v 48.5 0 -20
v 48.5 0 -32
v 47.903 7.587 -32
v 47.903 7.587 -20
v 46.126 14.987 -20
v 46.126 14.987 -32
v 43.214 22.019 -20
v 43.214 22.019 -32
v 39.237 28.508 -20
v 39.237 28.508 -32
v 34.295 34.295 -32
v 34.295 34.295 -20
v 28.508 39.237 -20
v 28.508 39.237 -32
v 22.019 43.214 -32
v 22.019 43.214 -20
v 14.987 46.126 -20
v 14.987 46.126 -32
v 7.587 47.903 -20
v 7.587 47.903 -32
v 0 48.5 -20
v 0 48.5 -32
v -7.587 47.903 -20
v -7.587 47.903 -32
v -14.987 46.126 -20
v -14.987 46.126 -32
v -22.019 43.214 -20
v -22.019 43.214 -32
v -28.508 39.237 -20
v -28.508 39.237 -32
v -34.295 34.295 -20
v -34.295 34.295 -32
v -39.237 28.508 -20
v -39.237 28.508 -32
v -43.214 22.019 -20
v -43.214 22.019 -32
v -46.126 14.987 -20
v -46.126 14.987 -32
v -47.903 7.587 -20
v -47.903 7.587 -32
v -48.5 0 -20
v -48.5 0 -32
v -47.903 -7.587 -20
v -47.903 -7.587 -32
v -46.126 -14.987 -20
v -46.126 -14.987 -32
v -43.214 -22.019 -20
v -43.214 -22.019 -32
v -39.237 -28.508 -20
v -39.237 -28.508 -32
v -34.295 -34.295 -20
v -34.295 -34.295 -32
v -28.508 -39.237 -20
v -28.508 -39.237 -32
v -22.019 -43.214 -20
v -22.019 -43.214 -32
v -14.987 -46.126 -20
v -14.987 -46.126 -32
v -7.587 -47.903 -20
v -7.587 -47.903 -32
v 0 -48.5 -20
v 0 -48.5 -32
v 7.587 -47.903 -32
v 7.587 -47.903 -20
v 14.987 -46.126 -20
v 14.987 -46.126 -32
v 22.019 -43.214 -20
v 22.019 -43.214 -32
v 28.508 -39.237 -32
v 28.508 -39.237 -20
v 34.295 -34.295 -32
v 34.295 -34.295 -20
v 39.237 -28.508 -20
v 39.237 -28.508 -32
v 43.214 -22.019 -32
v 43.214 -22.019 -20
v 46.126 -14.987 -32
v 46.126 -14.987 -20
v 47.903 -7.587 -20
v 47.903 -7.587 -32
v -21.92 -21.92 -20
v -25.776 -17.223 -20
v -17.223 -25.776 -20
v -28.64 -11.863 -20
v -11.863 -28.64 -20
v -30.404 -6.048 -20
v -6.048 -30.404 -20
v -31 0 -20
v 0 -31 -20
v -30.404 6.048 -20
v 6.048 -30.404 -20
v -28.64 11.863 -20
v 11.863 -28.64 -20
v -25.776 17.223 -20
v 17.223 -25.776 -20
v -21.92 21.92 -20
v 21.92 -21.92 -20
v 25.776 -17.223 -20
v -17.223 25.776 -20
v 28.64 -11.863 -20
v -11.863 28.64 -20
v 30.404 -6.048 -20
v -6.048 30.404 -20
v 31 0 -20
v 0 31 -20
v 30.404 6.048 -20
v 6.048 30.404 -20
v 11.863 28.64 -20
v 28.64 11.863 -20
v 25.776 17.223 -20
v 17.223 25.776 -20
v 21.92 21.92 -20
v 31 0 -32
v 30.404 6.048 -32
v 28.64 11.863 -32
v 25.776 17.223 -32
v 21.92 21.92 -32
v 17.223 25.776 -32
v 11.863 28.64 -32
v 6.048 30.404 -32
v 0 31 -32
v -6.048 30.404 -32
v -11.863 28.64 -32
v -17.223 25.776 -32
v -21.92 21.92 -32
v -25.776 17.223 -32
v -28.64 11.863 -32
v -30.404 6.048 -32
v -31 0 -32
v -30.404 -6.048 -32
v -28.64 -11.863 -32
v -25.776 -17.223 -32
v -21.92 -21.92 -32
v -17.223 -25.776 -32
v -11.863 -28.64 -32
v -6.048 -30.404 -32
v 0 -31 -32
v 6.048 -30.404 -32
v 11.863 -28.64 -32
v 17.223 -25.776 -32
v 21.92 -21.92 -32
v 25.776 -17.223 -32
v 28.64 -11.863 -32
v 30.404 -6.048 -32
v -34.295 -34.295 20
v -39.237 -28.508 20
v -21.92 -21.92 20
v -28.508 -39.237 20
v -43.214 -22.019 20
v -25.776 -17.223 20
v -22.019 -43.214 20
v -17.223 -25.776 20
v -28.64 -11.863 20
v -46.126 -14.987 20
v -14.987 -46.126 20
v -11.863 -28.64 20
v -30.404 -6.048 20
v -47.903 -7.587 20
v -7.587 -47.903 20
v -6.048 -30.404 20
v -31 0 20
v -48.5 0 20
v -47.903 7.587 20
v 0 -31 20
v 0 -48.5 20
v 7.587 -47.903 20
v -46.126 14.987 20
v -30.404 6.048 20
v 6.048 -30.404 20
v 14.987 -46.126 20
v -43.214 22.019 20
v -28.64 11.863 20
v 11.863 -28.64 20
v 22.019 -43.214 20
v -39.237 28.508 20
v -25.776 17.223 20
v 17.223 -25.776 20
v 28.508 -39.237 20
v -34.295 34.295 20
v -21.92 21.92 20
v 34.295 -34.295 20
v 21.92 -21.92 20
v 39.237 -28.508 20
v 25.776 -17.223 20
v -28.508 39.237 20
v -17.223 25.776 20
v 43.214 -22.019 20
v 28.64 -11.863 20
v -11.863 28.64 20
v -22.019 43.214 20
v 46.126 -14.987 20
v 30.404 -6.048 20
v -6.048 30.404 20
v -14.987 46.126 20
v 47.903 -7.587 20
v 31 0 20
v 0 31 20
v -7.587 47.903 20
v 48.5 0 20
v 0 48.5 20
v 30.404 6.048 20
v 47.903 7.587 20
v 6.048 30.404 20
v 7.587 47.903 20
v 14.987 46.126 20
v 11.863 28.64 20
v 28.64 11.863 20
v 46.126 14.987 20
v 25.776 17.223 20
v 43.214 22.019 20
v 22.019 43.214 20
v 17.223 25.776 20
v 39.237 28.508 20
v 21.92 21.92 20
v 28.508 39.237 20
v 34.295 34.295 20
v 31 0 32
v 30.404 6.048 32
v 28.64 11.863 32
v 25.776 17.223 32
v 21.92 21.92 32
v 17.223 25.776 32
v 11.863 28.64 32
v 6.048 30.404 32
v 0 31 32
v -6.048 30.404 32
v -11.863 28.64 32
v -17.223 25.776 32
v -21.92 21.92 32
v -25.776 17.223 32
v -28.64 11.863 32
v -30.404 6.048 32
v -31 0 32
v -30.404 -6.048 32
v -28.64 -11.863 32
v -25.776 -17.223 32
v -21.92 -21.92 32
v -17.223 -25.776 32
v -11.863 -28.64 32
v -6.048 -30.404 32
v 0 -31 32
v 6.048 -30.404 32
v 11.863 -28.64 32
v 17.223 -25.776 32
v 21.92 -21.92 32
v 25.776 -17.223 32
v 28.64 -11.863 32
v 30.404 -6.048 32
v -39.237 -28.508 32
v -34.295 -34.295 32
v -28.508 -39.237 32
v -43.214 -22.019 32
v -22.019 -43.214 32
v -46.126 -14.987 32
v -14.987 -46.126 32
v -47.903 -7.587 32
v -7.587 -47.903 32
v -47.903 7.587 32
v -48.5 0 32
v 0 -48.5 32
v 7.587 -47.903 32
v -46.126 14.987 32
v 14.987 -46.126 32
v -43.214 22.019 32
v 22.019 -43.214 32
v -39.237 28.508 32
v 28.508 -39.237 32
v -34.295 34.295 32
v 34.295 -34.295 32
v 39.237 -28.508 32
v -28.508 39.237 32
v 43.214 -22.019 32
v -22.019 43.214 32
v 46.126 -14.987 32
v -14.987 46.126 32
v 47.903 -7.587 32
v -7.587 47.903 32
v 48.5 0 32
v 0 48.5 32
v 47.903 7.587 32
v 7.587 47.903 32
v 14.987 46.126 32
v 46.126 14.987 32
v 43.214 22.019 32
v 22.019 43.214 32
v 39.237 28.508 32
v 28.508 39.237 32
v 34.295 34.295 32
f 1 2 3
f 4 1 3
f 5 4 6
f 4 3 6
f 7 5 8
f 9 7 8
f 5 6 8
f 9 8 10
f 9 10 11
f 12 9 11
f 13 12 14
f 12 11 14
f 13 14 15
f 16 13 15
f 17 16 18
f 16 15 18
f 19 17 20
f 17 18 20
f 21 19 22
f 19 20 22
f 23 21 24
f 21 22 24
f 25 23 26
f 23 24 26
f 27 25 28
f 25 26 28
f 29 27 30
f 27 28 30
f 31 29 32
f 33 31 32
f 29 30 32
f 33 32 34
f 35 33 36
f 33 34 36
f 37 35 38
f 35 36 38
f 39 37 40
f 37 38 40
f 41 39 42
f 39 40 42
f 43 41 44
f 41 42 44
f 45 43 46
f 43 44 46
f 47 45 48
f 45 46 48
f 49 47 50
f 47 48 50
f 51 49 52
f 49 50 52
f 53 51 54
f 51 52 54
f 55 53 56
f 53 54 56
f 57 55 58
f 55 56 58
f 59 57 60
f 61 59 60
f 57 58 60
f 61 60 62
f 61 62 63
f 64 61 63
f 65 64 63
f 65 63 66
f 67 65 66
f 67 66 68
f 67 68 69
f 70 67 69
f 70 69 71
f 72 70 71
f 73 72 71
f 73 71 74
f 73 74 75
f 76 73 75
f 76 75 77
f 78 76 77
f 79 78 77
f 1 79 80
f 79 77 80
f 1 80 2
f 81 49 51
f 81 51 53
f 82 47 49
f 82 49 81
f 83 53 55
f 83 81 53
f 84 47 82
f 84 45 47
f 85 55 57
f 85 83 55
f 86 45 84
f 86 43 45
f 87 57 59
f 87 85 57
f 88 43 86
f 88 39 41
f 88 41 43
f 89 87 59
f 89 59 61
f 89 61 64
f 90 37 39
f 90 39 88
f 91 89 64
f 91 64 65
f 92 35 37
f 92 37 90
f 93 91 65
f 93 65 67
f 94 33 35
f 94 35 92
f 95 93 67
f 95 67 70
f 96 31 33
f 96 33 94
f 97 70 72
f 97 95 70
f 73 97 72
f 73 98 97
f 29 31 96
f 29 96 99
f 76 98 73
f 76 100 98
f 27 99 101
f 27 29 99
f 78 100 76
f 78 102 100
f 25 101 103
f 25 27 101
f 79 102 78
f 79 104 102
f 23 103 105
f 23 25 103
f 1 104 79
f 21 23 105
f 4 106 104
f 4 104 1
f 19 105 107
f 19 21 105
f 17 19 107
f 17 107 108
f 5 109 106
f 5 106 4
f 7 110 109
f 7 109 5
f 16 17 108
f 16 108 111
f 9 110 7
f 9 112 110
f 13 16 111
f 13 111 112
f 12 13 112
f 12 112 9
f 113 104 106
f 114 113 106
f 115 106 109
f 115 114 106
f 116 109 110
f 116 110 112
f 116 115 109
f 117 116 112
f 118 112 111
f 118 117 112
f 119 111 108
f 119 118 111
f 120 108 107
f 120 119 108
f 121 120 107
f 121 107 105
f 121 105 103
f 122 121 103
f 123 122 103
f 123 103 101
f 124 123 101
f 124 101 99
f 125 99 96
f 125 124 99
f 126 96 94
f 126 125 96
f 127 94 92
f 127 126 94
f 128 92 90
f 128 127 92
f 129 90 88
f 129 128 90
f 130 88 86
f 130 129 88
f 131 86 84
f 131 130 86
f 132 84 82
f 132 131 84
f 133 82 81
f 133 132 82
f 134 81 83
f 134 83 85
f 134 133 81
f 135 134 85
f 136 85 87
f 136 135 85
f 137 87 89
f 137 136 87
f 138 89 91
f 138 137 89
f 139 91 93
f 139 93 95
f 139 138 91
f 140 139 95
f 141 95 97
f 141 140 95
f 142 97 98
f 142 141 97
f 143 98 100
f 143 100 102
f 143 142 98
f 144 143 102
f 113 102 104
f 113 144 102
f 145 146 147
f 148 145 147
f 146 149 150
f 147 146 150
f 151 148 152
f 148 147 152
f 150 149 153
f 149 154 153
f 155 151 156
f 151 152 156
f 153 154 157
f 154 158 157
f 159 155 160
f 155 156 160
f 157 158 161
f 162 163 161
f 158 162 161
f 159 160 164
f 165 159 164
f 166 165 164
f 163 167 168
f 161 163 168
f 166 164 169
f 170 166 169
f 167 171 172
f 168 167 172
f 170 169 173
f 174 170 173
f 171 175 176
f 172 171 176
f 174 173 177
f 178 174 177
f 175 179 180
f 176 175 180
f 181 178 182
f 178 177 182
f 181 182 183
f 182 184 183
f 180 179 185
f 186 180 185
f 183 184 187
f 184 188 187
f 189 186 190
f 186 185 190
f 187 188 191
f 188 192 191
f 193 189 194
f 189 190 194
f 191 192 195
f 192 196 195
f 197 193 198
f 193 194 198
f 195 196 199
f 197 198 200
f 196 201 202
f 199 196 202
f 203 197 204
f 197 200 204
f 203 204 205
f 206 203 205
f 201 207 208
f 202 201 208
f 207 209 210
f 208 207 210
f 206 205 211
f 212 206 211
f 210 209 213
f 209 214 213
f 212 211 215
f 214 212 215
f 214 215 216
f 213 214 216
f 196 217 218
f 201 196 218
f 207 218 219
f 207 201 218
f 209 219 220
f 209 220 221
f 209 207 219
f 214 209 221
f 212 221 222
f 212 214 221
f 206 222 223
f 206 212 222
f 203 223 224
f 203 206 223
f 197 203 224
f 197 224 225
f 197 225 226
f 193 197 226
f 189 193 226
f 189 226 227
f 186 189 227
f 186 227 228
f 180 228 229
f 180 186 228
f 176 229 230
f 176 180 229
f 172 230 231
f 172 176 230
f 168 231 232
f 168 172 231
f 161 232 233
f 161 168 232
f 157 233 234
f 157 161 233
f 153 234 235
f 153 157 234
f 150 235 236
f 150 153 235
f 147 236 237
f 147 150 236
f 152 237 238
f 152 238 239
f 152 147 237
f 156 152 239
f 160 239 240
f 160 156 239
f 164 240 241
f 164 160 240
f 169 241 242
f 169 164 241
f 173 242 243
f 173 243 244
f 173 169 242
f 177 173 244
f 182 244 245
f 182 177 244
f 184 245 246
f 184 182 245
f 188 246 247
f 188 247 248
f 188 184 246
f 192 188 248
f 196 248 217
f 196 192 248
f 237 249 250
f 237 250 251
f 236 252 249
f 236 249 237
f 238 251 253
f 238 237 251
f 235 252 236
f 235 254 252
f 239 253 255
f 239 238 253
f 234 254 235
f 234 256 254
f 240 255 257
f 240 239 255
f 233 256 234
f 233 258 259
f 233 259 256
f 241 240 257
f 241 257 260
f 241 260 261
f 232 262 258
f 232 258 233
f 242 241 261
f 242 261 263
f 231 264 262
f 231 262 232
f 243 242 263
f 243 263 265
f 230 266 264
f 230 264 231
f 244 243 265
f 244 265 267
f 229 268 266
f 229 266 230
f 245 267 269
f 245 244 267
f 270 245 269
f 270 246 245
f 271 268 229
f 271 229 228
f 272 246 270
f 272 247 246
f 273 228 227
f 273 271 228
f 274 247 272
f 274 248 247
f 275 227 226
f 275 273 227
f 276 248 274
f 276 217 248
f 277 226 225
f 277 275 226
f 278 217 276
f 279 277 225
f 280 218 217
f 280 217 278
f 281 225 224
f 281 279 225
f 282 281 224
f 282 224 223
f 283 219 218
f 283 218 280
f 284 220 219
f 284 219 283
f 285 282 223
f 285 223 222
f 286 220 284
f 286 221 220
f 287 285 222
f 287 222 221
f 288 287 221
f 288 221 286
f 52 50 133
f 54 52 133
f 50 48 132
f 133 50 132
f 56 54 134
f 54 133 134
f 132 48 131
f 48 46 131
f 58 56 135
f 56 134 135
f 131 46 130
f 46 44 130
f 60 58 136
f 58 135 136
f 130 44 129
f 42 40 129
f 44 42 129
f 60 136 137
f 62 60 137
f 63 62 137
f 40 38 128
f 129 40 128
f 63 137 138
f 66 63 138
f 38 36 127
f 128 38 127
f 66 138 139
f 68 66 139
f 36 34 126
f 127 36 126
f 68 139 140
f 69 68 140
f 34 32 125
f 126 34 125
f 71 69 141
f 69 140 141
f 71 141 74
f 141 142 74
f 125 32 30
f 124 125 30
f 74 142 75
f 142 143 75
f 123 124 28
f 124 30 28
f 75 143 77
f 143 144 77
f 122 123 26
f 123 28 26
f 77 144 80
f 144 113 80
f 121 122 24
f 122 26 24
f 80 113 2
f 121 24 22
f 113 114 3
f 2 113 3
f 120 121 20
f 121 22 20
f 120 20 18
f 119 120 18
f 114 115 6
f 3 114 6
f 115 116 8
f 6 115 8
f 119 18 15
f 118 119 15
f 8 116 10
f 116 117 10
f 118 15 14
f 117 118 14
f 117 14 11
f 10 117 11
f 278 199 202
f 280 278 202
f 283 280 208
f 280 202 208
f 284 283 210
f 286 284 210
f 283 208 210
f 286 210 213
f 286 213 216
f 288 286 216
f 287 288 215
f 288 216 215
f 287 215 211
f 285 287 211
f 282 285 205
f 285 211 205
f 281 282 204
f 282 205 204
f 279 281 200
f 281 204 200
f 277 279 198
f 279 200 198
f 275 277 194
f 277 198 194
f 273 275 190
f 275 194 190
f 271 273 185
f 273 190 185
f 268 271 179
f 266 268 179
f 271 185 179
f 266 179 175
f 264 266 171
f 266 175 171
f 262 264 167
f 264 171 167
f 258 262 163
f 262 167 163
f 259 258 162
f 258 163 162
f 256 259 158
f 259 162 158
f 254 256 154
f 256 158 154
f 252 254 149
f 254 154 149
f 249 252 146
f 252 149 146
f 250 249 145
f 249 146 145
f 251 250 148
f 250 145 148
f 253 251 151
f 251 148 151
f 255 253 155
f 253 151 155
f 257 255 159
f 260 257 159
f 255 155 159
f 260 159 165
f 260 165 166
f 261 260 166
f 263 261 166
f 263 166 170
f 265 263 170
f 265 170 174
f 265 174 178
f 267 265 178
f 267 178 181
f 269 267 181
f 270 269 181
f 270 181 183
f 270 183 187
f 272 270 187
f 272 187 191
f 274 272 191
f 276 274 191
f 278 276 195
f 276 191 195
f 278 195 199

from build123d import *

# Parameters (mm, degrees)
REAR_ENDTURN_START  = -32
SKETCH_1_R          = 48.5
SKETCH_1_R_2        = 31
REAR_ENDTURN_DEPTH  = 12
FRONT_ENDTURN_START = 20
SKETCH_2_R          = 48.5
SKETCH_2_R_2        = 31
FRONT_ENDTURN_DEPTH = 12


with BuildPart() as part:
    # Эскиз1 → Rear_endturn (new body)
    with BuildSketch(Plane.XY.offset(REAR_ENDTURN_START)):
        Circle(SKETCH_1_R)
        Circle(SKETCH_1_R_2, mode=Mode.SUBTRACT)
    extrude(amount=REAR_ENDTURN_DEPTH)


with BuildPart() as body_2:
    # Эскиз2 → Front_endturn (new body)
    with BuildSketch(Plane.XY.offset(FRONT_ENDTURN_START)):
        Circle(SKETCH_2_R)
        Circle(SKETCH_2_R_2, mode=Mode.SUBTRACT)
    extrude(amount=FRONT_ENDTURN_DEPTH)


solid = Compound([part.part, body_2.part])
